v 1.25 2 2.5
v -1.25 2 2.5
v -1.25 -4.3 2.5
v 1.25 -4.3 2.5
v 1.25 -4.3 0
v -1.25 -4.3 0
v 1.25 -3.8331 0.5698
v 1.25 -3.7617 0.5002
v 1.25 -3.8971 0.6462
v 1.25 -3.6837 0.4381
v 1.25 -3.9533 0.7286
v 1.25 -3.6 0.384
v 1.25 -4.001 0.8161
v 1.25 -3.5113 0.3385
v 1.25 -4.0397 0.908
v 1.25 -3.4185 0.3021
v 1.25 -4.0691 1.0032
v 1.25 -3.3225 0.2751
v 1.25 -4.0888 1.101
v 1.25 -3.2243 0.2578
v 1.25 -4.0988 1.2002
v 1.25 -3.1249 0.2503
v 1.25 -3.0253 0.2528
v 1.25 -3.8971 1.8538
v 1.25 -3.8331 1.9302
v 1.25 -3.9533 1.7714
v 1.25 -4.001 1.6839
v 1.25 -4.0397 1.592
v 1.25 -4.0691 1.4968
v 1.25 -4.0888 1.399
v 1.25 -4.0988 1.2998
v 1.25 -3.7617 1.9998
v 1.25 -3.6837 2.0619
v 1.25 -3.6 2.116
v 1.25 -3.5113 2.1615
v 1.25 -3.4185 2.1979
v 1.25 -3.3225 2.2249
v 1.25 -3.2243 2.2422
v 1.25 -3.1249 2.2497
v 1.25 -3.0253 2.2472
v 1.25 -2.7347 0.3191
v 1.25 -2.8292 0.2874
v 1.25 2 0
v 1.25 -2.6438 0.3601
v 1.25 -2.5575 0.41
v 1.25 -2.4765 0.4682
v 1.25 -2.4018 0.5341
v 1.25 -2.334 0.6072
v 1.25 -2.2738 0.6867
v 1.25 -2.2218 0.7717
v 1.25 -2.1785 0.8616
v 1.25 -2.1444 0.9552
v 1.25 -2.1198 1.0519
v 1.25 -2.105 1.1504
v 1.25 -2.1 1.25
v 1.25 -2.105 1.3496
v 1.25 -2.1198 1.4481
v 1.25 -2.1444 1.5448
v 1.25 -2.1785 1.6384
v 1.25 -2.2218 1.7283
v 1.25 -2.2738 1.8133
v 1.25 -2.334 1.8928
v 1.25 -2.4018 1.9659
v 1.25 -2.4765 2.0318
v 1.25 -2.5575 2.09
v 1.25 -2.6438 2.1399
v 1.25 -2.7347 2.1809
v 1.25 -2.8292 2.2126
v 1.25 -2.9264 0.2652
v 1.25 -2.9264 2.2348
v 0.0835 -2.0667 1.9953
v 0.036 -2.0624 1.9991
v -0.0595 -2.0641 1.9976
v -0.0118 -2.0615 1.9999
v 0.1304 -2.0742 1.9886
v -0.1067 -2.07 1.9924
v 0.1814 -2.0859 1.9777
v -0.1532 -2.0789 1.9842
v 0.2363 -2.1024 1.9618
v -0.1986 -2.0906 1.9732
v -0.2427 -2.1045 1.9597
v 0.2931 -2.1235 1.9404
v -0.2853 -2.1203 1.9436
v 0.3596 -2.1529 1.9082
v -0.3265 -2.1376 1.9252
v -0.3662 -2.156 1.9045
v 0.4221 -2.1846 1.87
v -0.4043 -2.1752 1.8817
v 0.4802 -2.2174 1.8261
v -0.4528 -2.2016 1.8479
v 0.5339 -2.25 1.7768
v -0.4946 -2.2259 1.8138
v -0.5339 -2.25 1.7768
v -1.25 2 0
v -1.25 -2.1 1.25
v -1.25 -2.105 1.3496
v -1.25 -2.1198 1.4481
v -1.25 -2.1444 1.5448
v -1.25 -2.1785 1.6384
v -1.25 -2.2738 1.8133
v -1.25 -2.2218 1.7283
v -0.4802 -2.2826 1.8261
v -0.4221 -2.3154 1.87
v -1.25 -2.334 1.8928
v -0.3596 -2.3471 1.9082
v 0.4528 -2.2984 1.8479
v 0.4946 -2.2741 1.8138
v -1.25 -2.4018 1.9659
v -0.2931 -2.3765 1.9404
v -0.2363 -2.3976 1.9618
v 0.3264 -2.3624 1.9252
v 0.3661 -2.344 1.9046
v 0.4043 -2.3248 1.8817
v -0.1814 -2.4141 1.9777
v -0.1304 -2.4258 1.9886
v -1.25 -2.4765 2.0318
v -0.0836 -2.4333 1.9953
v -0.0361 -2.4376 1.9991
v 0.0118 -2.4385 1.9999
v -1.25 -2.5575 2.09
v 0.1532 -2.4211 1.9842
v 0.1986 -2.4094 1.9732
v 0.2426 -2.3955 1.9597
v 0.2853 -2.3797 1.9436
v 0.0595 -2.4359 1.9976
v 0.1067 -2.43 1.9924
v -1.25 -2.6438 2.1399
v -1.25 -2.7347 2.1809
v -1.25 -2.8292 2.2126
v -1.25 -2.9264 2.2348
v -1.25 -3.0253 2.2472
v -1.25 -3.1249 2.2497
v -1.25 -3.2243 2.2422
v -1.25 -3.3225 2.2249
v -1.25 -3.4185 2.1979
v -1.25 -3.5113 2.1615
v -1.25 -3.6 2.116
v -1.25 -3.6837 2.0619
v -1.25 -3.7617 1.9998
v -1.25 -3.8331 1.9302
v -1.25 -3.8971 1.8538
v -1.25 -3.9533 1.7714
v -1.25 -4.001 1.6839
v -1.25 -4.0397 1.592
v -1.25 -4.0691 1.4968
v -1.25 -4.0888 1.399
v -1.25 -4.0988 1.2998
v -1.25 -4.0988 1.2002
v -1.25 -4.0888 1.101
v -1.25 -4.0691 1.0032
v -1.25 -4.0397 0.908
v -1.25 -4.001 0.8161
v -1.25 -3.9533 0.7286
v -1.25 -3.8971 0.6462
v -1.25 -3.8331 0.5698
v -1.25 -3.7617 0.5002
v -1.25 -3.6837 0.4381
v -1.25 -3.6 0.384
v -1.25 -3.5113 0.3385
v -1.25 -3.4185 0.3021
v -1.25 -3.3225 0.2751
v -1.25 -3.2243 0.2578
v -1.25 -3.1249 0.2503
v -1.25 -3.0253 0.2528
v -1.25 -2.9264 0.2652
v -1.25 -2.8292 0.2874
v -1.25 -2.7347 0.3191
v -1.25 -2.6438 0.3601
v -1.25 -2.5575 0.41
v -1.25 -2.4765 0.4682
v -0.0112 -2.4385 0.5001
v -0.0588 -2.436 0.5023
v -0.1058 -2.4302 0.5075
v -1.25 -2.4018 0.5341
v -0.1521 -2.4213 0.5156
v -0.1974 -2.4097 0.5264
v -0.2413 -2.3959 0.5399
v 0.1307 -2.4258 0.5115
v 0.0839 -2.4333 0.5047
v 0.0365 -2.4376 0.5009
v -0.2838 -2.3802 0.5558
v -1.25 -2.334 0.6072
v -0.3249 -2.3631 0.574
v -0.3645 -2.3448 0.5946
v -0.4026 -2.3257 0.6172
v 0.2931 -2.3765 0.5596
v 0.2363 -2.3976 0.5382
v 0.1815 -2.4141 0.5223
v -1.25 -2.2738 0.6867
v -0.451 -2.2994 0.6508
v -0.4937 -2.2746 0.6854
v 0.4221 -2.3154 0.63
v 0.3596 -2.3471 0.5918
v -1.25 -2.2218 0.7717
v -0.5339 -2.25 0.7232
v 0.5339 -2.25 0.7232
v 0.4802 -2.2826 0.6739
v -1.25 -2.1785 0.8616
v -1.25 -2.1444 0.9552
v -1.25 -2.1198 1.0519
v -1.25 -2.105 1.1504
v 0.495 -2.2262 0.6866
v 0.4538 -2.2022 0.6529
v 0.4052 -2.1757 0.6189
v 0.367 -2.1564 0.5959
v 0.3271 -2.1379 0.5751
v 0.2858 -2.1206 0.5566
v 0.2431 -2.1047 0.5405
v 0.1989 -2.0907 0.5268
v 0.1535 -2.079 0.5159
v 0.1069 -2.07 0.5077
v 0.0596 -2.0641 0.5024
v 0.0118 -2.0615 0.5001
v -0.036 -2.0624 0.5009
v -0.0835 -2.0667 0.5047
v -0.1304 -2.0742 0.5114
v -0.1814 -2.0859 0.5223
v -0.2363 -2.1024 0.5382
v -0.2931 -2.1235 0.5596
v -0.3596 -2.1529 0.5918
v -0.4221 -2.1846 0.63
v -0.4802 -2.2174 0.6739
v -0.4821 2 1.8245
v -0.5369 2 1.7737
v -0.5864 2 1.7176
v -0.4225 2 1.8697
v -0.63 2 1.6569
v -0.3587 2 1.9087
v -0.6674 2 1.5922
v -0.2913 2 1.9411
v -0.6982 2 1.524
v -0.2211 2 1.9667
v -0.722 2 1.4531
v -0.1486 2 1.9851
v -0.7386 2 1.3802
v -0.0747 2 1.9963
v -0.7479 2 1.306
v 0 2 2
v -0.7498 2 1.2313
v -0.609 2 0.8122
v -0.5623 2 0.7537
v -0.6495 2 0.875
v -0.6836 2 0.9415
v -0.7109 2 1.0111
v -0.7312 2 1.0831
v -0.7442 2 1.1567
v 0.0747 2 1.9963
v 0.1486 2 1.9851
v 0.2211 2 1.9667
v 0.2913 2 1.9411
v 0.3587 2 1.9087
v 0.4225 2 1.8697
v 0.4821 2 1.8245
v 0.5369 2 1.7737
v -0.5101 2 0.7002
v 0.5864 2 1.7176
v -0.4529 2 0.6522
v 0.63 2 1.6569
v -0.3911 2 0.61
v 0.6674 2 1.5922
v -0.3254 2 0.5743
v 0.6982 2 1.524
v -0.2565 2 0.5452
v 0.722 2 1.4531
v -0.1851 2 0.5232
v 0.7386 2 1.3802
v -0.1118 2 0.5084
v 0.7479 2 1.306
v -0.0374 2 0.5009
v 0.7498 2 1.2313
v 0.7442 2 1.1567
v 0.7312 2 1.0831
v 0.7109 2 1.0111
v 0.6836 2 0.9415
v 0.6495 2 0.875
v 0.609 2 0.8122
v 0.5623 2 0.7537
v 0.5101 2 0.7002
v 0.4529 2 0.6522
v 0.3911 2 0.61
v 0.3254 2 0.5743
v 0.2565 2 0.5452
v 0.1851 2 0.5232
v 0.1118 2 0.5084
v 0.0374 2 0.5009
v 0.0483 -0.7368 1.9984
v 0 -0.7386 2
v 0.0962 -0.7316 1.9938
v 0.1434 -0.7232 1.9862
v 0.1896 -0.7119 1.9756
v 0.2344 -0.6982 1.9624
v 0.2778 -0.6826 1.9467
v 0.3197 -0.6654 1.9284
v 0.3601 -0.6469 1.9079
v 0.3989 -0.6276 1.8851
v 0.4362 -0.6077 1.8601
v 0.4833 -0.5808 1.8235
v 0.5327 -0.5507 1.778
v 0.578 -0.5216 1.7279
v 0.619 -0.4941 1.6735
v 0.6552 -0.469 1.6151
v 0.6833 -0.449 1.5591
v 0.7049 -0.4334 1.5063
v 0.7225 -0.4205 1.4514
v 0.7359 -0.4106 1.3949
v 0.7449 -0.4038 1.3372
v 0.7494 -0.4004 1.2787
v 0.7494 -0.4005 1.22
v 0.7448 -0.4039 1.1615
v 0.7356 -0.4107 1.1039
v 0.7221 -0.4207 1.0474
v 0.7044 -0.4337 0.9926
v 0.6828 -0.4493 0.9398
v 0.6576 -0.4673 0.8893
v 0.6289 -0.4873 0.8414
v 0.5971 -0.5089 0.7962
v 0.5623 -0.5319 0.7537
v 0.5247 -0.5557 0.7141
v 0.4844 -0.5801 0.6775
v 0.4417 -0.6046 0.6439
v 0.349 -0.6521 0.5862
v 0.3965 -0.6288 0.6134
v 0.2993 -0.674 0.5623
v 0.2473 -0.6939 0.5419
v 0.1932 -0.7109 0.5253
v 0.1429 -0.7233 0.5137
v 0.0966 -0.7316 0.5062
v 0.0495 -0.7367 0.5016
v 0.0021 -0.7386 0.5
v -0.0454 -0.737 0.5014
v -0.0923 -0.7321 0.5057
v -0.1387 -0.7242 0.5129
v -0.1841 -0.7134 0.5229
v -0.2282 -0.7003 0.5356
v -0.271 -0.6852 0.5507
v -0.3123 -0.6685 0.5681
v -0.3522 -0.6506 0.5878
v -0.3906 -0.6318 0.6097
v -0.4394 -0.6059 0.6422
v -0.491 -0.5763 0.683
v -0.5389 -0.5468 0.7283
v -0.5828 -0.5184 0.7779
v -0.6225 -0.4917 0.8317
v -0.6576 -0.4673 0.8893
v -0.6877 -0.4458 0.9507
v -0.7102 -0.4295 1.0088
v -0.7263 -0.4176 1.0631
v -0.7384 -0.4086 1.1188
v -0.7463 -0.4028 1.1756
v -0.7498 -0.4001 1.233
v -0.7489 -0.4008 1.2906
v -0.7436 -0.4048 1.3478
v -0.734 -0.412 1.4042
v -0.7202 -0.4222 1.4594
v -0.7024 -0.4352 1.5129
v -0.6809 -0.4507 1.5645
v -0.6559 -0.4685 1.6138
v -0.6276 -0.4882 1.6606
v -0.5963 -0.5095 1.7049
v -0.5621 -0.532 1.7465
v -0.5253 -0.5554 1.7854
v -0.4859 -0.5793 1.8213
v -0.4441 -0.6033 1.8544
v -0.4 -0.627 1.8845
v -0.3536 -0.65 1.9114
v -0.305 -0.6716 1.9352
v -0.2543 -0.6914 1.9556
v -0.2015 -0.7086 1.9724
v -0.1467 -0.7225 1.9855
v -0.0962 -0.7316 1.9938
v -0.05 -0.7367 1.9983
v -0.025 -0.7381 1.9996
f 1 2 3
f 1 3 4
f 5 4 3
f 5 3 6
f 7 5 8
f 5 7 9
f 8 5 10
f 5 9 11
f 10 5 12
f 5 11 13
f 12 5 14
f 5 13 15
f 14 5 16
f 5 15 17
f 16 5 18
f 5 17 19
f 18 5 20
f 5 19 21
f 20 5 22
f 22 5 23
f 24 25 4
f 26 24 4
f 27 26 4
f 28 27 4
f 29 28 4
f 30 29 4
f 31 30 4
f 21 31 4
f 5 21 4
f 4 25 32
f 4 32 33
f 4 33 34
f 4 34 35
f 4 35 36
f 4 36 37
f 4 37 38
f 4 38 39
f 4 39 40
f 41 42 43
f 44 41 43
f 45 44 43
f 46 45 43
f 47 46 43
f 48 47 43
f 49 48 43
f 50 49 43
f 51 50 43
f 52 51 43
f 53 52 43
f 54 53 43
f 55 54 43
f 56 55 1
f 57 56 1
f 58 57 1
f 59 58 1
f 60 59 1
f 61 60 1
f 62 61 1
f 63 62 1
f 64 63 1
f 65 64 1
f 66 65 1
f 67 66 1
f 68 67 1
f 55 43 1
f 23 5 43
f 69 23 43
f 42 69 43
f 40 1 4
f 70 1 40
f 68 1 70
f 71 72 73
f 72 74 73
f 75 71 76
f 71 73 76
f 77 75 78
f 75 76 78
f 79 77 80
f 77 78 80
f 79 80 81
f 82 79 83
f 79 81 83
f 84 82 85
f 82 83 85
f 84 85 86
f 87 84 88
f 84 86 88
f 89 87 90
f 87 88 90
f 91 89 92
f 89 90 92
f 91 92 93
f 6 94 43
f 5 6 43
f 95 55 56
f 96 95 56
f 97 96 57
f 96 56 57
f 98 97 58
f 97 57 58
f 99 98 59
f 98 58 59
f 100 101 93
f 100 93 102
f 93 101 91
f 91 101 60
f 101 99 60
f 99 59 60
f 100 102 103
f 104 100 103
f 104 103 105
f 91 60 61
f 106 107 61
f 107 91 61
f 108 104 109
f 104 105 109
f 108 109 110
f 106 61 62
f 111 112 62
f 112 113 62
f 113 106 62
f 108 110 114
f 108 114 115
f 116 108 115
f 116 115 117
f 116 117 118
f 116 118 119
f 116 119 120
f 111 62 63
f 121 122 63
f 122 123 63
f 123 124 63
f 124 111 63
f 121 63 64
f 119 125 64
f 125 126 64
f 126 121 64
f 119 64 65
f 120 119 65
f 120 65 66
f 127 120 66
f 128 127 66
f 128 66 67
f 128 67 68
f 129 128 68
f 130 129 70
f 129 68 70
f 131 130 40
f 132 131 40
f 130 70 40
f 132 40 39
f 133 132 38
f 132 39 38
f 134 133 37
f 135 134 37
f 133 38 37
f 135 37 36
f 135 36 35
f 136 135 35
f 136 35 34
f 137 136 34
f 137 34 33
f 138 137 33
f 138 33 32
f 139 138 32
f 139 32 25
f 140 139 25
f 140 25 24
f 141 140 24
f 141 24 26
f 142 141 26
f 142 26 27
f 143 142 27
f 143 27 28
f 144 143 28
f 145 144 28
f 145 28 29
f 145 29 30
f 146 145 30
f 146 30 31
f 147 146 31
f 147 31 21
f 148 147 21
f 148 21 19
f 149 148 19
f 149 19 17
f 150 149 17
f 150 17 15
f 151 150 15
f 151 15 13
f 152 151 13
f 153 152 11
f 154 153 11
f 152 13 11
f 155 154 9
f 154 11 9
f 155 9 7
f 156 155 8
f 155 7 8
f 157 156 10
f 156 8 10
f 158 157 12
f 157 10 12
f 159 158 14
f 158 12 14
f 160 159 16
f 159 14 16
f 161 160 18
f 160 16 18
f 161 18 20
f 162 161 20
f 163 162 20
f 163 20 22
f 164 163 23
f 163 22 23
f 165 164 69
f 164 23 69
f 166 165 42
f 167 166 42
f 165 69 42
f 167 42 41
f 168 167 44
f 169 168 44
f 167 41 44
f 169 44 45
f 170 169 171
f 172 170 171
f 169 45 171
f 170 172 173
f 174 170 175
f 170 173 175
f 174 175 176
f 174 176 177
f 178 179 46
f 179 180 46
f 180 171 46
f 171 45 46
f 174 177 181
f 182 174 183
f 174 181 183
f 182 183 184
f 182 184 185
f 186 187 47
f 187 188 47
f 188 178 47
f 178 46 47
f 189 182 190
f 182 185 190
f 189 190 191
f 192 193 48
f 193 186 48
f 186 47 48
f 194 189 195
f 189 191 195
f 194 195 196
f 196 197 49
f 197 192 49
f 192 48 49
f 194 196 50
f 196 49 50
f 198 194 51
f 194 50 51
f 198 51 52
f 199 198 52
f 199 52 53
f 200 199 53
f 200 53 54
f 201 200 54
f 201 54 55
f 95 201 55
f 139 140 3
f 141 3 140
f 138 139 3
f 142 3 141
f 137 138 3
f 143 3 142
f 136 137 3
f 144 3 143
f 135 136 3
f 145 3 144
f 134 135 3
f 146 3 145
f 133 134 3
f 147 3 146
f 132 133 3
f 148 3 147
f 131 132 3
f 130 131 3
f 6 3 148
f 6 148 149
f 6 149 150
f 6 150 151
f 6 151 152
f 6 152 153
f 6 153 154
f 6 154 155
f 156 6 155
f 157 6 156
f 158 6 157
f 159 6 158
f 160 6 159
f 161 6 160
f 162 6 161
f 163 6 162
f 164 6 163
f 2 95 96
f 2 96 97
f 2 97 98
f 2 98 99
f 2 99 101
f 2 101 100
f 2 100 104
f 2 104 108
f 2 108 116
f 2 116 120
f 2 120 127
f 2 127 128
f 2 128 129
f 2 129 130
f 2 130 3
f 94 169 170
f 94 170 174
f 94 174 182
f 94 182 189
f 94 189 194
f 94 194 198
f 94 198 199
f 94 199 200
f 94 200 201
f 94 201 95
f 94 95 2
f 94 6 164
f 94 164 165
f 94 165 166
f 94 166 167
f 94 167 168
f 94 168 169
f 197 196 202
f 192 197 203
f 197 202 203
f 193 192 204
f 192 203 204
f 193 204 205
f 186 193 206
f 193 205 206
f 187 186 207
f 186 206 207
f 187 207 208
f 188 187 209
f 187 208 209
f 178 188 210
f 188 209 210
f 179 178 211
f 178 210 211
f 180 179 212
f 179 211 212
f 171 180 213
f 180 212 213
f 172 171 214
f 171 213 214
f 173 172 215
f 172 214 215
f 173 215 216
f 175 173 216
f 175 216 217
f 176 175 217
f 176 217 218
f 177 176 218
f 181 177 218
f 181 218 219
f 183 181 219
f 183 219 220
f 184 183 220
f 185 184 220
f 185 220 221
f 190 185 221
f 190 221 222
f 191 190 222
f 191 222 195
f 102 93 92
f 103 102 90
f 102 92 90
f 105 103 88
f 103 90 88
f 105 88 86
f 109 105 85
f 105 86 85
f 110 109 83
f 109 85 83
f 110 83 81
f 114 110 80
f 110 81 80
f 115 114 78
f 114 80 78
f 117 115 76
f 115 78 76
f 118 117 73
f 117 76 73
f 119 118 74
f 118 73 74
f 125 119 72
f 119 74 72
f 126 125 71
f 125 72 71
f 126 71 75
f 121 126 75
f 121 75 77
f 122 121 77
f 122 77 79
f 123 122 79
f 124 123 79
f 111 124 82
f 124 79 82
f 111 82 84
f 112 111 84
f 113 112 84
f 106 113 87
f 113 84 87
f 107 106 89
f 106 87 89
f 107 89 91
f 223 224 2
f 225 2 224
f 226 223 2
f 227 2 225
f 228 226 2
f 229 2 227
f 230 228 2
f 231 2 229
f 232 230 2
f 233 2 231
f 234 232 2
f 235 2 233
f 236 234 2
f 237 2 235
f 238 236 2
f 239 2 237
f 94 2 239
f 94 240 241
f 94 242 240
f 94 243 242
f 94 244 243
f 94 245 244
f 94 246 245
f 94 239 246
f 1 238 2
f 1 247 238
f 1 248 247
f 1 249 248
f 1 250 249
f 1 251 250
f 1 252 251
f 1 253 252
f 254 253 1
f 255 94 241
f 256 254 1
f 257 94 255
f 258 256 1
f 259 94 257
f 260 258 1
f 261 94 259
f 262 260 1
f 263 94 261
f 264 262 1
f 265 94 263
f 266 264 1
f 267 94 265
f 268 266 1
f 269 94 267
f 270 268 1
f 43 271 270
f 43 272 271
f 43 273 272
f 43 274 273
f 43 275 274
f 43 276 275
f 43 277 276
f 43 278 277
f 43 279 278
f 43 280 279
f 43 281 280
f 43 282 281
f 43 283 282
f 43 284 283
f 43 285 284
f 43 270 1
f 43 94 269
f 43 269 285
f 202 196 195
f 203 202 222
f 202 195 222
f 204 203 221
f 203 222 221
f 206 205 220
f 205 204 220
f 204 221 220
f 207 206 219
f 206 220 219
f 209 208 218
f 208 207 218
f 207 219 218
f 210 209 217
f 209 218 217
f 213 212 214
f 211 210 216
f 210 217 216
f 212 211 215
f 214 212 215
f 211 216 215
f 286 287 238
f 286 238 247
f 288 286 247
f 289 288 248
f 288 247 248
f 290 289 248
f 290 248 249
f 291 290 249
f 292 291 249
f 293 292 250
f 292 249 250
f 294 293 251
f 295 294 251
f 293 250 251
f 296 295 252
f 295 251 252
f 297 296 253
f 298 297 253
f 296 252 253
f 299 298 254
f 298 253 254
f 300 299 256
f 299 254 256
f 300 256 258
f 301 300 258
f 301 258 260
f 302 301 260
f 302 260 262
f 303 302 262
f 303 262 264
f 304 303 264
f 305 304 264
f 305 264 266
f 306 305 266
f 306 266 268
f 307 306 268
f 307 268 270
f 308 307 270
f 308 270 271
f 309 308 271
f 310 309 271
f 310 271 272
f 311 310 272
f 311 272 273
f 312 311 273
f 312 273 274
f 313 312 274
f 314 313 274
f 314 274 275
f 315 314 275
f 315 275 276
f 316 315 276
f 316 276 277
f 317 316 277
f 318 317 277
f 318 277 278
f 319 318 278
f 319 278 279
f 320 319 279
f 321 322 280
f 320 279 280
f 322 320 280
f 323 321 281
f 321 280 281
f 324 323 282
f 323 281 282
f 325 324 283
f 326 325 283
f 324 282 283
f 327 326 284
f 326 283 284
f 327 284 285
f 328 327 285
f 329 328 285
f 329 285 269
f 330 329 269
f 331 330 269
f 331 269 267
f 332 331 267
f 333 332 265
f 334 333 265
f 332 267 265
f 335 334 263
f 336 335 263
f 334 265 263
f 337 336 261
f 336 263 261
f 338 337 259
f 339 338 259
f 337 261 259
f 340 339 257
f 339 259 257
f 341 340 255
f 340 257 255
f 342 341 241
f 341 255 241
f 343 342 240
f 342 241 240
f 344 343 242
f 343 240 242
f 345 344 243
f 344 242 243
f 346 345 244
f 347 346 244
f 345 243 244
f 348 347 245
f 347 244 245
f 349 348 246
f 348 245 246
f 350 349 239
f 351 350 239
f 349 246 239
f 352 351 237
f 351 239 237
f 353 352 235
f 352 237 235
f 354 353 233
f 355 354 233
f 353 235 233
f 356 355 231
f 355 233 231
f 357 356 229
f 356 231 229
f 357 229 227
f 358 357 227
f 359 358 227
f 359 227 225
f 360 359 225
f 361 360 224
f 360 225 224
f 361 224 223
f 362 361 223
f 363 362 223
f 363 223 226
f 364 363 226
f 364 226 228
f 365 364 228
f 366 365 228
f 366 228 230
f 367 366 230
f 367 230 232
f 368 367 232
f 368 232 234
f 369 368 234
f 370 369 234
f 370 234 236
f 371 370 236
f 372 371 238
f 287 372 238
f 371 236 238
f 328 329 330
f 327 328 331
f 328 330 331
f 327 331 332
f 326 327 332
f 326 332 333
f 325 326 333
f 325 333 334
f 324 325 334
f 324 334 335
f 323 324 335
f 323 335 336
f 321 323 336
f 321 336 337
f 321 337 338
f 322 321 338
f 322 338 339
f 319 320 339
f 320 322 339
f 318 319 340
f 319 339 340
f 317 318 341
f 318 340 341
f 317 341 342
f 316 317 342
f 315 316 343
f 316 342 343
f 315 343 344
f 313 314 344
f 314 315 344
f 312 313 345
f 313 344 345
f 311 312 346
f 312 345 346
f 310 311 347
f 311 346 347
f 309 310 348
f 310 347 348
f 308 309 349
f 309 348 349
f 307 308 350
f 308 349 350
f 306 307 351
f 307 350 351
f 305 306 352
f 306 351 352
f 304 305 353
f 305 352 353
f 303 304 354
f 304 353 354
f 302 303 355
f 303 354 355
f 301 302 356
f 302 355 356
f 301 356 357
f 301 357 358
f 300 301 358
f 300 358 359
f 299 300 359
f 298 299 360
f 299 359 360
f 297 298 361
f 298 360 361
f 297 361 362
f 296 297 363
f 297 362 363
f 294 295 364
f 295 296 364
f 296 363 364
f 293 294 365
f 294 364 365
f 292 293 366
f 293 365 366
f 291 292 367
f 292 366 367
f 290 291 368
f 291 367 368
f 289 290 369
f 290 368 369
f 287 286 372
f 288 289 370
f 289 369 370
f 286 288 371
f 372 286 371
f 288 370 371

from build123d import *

# Parameters (mm, degrees)
SKETCH1_W           = 2.5
SKETCH1_H           = 10
BOSS_EXTRUDE1_DEPTH = 2.5
SKETCH2_R           = 0.75
CUT_EXTRUDE1_DEPTH  = 3
SKETCH3_R           = 1
CUT_EXTRUDE3_DEPTH  = 7.5
SKETCH4_W           = 2.5
SKETCH4_H           = 2.5
CUT_EXTRUDE5_DEPTH  = 2
SKETCH6_R           = 0.75
CUT_EXTRUDE7_DEPTH  = 3
SKETCH7_W           = 2.5
SKETCH7_H           = 2.5
CUT_EXTRUDE8_DEPTH  = 1
SKETCH8_R           = 0.75
CUT_EXTRUDE9_DEPTH  = 2.5
SKETCH9_W           = 2.5
SKETCH9_H           = 2.4
SKETCH9_R           = 1
CUT_EXTRUDE11_DEPTH = 10
BOSS_EXTRUDE2_START = -2.5
SKETCH10_R          = 1
SKETCH10_W          = 2.5
SKETCH10_H          = 2.4
BOSS_EXTRUDE2_DEPTH = 2.5
SKETCH11_R          = 1
CUT_EXTRUDE12_DEPTH = 2.5
BOSS_EXTRUDE3_START = -2.5
SKETCH12_R          = 1
BOSS_EXTRUDE3_DEPTH = 2.5
SKETCH13_W          = 2.5
SKETCH13_H          = 0.7
CUT_EXTRUDE13_DEPTH = 2.5
SKETCH14_R          = 1
CUT_EXTRUDE14_DEPTH = 2.5


with BuildPart() as part:
    # Sketch1 → Boss-Extrude1 (new body)
    with BuildSketch(Plane.XY):
        Rectangle(SKETCH1_W, SKETCH1_H)
    extrude(amount=BOSS_EXTRUDE1_DEPTH)

    # Sketch2 → Cut-Extrude1 (cut)
    with BuildSketch(Plane(origin=(0, 5, 0), x_dir=(1, 0, 0), z_dir=(0, 1, 0))):
        with Locations(Location((0, -1.25, 0), (0, 0, 270))):
            Circle(SKETCH2_R)
    extrude(amount=-CUT_EXTRUDE1_DEPTH, mode=Mode.SUBTRACT)

    # Sketch3 → Cut-Extrude3 (cut)
    with BuildSketch(Plane.ZY.offset(1.25)):
        with Locations(Location((1.25, -3.8, 0), (0, 0, 270))):
            Circle(SKETCH3_R)
    extrude(amount=-CUT_EXTRUDE3_DEPTH, mode=Mode.SUBTRACT)

    # Sketch4 → Cut-Extrude5 (cut)
    with BuildSketch(Plane(origin=(0, 5, 0), x_dir=(1, 0, 0), z_dir=(0, 1, 0))):
        with Locations((0, -1.25)):
            Rectangle(SKETCH4_W, SKETCH4_H)
    extrude(amount=-CUT_EXTRUDE5_DEPTH, mode=Mode.SUBTRACT)

    # Sketch6 → Cut-Extrude7 (cut)
    with BuildSketch(Plane(origin=(0, 3, 0), x_dir=(1, 0, 0), z_dir=(0, 1, 0))):
        with Locations(Location((0, -1.25, 0), (0, 0, 270))):
            Circle(SKETCH6_R)
    extrude(amount=-CUT_EXTRUDE7_DEPTH, mode=Mode.SUBTRACT)

    # Sketch7 → Cut-Extrude8 (cut)
    with BuildSketch(Plane(origin=(0, 3, 0), x_dir=(1, 0, 0), z_dir=(0, 1, 0))):
        with Locations((0, -1.25)):
            Rectangle(SKETCH7_W, SKETCH7_H)
    extrude(amount=-CUT_EXTRUDE8_DEPTH, mode=Mode.SUBTRACT)

    # Sketch8 → Cut-Extrude9 (cut)
    with BuildSketch(Plane(origin=(0, 0, 0), x_dir=(1, 0, 0), z_dir=(0, 1, 0))):
        with Locations(Location((0, -1.25, 0), (0, 0, 270))):
            Circle(SKETCH8_R)
    extrude(amount=-CUT_EXTRUDE9_DEPTH, mode=Mode.SUBTRACT)

    # Sketch9 → Cut-Extrude11 (cut)
    # profile 1 of 2: a face of its own
    with BuildSketch(Plane.ZY.offset(1.25)):
        with Locations((1.25, -3.8)):
            Rectangle(SKETCH9_W, SKETCH9_H)
        with Locations((1.25, -3.8)):
            Circle(SKETCH9_R, mode=Mode.SUBTRACT)
    # profile 2 of 2: a face of its own
    with BuildSketch(Plane.ZY.offset(1.25)):
        with Locations(Location((1.25, -1.4, 0), (0, 0, 270))):
            Circle(SKETCH9_R)
    extrude(amount=-CUT_EXTRUDE11_DEPTH, mode=Mode.SUBTRACT)

    # Sketch10 → Boss-Extrude2 (add)
    with BuildSketch(Plane(origin=(1.25, 0, 0), x_dir=(0, 0, -1), z_dir=(1, 0, 0)).offset(BOSS_EXTRUDE2_START)):
        with Locations((-1.25, -1.4)):
            Circle(SKETCH10_R)
        with Locations((-1.25, -3.8)):
            Rectangle(SKETCH10_W, SKETCH10_H)
    extrude(amount=BOSS_EXTRUDE2_DEPTH)

    # Sketch11 → Cut-Extrude12 (cut)
    with BuildSketch(Plane(origin=(1.25, 0, 0), x_dir=(0, 0, -1), z_dir=(1, 0, 0))):
        with Locations(Location((-1.25, -3.8, 0), (0, 0, 90))):
            Circle(SKETCH11_R)
    extrude(amount=-CUT_EXTRUDE12_DEPTH, mode=Mode.SUBTRACT)

    # Sketch12 → Boss-Extrude3 (add)
    with BuildSketch(Plane.ZY.offset(1.25).offset(BOSS_EXTRUDE3_START)):
        with Locations((1.25, -3.8)):
            Circle(SKETCH12_R)
    extrude(amount=BOSS_EXTRUDE3_DEPTH)

    # Sketch13 → Cut-Extrude13 (cut)
    with BuildSketch(Plane(origin=(1.25, 0, 0), x_dir=(0, 0, -1), z_dir=(1, 0, 0))):
        with Locations((-1.25, -4.65)):
            Rectangle(SKETCH13_W, SKETCH13_H)
    extrude(amount=-CUT_EXTRUDE13_DEPTH, mode=Mode.SUBTRACT)

    # Sketch14 → Cut-Extrude14 (cut)
    with BuildSketch(Plane(origin=(1.25, 0, 0), x_dir=(0, 0, -1), z_dir=(1, 0, 0))):
        with Locations(Location((-1.25, -3.1, 0), (0, 0, 90))):
            Circle(SKETCH14_R)
    extrude(amount=-CUT_EXTRUDE14_DEPTH, mode=Mode.SUBTRACT)


solid = part.part
